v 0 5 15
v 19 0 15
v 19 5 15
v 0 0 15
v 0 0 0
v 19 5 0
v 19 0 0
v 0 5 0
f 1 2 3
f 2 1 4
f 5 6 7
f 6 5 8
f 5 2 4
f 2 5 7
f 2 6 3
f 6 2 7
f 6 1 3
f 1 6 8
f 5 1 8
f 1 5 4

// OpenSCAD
// Generated by SolidPython 1.0.1 on 2020-07-29 00:46:56


cube(size = [19, 5, 15]);
/***********************************************
*********      SolidPython code:      **********
************************************************
 
# import packages: SolidPython
from solid import *
from solid.utils import *
from itertools import chain, combinations, permutations


class Resize:

    def __init__(self, scad_file):
        self.scad_file = scad_file
        #self.scad_file = import_scad(scad_file)
        # cone/cylinder param:
        self.r1 = 0
        self.r2 = 0
        self.h = 0
        # rectangular prism param:
        self.w = 0
        self.l = 0
        # ellipse param:
        self.r = 0

    # import OpenScad code (file name corresponds to shape)


    # classify shape + parameters
    def assign(self, param1, param2, param3):
        if self.scad_file == 'cone.scad':
            self.r1 = param1
            self.r2 = param2
            self.h = param3
        elif self.scad_file == 'cylinder.scad':
            self.r1 = param1
            self.r2 = param2
            self.h = param3
        elif self.scad_file == 'rectangularPrism.scad':
            self.h = param1
            self.l = param2
            self.w = param3
        else:
            self.r = param1
            self.h = param2

    # resize parameters
    def iterate(self):
        x = range(3, 20, 2)
        i = 1
        if self.scad_file == 'cone.scad':
            tempList = list(permutations(x, 2))
            for temp in tempList:
                param1 = temp[0]
                param2 = temp[1]
                filepath = 'produced_scad_files/' + 'cone' + str(param1) + '_' + str(param2) + '_' + '.scad'
                scad_render_to_file(cylinder(h=param1, r1=param2, r2=0), filepath)

        elif self.scad_file == 'cylinder.scad':
            tempList = list(permutations(x, 3))
            for temp in tempList:
                param1 = temp[0]
                param2 = temp[1]
                filepath = 'produced_scad_files/' + 'cylinder' + str(param1) + '_' + str(param2) + '_' + '.scad'
                scad_render_to_file(cylinder(h=param1, r1=param2, r2=param2), filepath)

        elif self.scad_file == 'rectangularPrism.scad':
            tempList = list(permutations(x, 3))
            for temp in tempList:
                param1 = temp[0]
                param2 = temp[1]
                param3 = temp[2]
                filepath = 'produced_scad_files/' + 'rectangularPrism' + str(param1) + '_' + str(param2) + '_' + str(
                    param3) + '.scad'
                scad_render_to_file(cube(size=(param1, param2, param3)), filepath)

        elif self.scad_file == 'ellipse.scad':
            tempList = list(permutations(x, 4))
            for temp in tempList:
                param1 = temp[0]
                param2 = temp[1]
                param3 = temp[2]
                param4 = temp[3]
                filepath = 'produced_scad_files/' + 'ellipse' + str(param1) + '_' + str(param2) + '_' + str(param3) + '_' + str(param4) + '.scad'
                scad_render_to_file(scale([param1, param2, param3])(sphere(r=param4)), filepath)

    def render_to_scadfile(self):
        scad_render_to_file(scad, 'example.scad') 
 
************************************************/
